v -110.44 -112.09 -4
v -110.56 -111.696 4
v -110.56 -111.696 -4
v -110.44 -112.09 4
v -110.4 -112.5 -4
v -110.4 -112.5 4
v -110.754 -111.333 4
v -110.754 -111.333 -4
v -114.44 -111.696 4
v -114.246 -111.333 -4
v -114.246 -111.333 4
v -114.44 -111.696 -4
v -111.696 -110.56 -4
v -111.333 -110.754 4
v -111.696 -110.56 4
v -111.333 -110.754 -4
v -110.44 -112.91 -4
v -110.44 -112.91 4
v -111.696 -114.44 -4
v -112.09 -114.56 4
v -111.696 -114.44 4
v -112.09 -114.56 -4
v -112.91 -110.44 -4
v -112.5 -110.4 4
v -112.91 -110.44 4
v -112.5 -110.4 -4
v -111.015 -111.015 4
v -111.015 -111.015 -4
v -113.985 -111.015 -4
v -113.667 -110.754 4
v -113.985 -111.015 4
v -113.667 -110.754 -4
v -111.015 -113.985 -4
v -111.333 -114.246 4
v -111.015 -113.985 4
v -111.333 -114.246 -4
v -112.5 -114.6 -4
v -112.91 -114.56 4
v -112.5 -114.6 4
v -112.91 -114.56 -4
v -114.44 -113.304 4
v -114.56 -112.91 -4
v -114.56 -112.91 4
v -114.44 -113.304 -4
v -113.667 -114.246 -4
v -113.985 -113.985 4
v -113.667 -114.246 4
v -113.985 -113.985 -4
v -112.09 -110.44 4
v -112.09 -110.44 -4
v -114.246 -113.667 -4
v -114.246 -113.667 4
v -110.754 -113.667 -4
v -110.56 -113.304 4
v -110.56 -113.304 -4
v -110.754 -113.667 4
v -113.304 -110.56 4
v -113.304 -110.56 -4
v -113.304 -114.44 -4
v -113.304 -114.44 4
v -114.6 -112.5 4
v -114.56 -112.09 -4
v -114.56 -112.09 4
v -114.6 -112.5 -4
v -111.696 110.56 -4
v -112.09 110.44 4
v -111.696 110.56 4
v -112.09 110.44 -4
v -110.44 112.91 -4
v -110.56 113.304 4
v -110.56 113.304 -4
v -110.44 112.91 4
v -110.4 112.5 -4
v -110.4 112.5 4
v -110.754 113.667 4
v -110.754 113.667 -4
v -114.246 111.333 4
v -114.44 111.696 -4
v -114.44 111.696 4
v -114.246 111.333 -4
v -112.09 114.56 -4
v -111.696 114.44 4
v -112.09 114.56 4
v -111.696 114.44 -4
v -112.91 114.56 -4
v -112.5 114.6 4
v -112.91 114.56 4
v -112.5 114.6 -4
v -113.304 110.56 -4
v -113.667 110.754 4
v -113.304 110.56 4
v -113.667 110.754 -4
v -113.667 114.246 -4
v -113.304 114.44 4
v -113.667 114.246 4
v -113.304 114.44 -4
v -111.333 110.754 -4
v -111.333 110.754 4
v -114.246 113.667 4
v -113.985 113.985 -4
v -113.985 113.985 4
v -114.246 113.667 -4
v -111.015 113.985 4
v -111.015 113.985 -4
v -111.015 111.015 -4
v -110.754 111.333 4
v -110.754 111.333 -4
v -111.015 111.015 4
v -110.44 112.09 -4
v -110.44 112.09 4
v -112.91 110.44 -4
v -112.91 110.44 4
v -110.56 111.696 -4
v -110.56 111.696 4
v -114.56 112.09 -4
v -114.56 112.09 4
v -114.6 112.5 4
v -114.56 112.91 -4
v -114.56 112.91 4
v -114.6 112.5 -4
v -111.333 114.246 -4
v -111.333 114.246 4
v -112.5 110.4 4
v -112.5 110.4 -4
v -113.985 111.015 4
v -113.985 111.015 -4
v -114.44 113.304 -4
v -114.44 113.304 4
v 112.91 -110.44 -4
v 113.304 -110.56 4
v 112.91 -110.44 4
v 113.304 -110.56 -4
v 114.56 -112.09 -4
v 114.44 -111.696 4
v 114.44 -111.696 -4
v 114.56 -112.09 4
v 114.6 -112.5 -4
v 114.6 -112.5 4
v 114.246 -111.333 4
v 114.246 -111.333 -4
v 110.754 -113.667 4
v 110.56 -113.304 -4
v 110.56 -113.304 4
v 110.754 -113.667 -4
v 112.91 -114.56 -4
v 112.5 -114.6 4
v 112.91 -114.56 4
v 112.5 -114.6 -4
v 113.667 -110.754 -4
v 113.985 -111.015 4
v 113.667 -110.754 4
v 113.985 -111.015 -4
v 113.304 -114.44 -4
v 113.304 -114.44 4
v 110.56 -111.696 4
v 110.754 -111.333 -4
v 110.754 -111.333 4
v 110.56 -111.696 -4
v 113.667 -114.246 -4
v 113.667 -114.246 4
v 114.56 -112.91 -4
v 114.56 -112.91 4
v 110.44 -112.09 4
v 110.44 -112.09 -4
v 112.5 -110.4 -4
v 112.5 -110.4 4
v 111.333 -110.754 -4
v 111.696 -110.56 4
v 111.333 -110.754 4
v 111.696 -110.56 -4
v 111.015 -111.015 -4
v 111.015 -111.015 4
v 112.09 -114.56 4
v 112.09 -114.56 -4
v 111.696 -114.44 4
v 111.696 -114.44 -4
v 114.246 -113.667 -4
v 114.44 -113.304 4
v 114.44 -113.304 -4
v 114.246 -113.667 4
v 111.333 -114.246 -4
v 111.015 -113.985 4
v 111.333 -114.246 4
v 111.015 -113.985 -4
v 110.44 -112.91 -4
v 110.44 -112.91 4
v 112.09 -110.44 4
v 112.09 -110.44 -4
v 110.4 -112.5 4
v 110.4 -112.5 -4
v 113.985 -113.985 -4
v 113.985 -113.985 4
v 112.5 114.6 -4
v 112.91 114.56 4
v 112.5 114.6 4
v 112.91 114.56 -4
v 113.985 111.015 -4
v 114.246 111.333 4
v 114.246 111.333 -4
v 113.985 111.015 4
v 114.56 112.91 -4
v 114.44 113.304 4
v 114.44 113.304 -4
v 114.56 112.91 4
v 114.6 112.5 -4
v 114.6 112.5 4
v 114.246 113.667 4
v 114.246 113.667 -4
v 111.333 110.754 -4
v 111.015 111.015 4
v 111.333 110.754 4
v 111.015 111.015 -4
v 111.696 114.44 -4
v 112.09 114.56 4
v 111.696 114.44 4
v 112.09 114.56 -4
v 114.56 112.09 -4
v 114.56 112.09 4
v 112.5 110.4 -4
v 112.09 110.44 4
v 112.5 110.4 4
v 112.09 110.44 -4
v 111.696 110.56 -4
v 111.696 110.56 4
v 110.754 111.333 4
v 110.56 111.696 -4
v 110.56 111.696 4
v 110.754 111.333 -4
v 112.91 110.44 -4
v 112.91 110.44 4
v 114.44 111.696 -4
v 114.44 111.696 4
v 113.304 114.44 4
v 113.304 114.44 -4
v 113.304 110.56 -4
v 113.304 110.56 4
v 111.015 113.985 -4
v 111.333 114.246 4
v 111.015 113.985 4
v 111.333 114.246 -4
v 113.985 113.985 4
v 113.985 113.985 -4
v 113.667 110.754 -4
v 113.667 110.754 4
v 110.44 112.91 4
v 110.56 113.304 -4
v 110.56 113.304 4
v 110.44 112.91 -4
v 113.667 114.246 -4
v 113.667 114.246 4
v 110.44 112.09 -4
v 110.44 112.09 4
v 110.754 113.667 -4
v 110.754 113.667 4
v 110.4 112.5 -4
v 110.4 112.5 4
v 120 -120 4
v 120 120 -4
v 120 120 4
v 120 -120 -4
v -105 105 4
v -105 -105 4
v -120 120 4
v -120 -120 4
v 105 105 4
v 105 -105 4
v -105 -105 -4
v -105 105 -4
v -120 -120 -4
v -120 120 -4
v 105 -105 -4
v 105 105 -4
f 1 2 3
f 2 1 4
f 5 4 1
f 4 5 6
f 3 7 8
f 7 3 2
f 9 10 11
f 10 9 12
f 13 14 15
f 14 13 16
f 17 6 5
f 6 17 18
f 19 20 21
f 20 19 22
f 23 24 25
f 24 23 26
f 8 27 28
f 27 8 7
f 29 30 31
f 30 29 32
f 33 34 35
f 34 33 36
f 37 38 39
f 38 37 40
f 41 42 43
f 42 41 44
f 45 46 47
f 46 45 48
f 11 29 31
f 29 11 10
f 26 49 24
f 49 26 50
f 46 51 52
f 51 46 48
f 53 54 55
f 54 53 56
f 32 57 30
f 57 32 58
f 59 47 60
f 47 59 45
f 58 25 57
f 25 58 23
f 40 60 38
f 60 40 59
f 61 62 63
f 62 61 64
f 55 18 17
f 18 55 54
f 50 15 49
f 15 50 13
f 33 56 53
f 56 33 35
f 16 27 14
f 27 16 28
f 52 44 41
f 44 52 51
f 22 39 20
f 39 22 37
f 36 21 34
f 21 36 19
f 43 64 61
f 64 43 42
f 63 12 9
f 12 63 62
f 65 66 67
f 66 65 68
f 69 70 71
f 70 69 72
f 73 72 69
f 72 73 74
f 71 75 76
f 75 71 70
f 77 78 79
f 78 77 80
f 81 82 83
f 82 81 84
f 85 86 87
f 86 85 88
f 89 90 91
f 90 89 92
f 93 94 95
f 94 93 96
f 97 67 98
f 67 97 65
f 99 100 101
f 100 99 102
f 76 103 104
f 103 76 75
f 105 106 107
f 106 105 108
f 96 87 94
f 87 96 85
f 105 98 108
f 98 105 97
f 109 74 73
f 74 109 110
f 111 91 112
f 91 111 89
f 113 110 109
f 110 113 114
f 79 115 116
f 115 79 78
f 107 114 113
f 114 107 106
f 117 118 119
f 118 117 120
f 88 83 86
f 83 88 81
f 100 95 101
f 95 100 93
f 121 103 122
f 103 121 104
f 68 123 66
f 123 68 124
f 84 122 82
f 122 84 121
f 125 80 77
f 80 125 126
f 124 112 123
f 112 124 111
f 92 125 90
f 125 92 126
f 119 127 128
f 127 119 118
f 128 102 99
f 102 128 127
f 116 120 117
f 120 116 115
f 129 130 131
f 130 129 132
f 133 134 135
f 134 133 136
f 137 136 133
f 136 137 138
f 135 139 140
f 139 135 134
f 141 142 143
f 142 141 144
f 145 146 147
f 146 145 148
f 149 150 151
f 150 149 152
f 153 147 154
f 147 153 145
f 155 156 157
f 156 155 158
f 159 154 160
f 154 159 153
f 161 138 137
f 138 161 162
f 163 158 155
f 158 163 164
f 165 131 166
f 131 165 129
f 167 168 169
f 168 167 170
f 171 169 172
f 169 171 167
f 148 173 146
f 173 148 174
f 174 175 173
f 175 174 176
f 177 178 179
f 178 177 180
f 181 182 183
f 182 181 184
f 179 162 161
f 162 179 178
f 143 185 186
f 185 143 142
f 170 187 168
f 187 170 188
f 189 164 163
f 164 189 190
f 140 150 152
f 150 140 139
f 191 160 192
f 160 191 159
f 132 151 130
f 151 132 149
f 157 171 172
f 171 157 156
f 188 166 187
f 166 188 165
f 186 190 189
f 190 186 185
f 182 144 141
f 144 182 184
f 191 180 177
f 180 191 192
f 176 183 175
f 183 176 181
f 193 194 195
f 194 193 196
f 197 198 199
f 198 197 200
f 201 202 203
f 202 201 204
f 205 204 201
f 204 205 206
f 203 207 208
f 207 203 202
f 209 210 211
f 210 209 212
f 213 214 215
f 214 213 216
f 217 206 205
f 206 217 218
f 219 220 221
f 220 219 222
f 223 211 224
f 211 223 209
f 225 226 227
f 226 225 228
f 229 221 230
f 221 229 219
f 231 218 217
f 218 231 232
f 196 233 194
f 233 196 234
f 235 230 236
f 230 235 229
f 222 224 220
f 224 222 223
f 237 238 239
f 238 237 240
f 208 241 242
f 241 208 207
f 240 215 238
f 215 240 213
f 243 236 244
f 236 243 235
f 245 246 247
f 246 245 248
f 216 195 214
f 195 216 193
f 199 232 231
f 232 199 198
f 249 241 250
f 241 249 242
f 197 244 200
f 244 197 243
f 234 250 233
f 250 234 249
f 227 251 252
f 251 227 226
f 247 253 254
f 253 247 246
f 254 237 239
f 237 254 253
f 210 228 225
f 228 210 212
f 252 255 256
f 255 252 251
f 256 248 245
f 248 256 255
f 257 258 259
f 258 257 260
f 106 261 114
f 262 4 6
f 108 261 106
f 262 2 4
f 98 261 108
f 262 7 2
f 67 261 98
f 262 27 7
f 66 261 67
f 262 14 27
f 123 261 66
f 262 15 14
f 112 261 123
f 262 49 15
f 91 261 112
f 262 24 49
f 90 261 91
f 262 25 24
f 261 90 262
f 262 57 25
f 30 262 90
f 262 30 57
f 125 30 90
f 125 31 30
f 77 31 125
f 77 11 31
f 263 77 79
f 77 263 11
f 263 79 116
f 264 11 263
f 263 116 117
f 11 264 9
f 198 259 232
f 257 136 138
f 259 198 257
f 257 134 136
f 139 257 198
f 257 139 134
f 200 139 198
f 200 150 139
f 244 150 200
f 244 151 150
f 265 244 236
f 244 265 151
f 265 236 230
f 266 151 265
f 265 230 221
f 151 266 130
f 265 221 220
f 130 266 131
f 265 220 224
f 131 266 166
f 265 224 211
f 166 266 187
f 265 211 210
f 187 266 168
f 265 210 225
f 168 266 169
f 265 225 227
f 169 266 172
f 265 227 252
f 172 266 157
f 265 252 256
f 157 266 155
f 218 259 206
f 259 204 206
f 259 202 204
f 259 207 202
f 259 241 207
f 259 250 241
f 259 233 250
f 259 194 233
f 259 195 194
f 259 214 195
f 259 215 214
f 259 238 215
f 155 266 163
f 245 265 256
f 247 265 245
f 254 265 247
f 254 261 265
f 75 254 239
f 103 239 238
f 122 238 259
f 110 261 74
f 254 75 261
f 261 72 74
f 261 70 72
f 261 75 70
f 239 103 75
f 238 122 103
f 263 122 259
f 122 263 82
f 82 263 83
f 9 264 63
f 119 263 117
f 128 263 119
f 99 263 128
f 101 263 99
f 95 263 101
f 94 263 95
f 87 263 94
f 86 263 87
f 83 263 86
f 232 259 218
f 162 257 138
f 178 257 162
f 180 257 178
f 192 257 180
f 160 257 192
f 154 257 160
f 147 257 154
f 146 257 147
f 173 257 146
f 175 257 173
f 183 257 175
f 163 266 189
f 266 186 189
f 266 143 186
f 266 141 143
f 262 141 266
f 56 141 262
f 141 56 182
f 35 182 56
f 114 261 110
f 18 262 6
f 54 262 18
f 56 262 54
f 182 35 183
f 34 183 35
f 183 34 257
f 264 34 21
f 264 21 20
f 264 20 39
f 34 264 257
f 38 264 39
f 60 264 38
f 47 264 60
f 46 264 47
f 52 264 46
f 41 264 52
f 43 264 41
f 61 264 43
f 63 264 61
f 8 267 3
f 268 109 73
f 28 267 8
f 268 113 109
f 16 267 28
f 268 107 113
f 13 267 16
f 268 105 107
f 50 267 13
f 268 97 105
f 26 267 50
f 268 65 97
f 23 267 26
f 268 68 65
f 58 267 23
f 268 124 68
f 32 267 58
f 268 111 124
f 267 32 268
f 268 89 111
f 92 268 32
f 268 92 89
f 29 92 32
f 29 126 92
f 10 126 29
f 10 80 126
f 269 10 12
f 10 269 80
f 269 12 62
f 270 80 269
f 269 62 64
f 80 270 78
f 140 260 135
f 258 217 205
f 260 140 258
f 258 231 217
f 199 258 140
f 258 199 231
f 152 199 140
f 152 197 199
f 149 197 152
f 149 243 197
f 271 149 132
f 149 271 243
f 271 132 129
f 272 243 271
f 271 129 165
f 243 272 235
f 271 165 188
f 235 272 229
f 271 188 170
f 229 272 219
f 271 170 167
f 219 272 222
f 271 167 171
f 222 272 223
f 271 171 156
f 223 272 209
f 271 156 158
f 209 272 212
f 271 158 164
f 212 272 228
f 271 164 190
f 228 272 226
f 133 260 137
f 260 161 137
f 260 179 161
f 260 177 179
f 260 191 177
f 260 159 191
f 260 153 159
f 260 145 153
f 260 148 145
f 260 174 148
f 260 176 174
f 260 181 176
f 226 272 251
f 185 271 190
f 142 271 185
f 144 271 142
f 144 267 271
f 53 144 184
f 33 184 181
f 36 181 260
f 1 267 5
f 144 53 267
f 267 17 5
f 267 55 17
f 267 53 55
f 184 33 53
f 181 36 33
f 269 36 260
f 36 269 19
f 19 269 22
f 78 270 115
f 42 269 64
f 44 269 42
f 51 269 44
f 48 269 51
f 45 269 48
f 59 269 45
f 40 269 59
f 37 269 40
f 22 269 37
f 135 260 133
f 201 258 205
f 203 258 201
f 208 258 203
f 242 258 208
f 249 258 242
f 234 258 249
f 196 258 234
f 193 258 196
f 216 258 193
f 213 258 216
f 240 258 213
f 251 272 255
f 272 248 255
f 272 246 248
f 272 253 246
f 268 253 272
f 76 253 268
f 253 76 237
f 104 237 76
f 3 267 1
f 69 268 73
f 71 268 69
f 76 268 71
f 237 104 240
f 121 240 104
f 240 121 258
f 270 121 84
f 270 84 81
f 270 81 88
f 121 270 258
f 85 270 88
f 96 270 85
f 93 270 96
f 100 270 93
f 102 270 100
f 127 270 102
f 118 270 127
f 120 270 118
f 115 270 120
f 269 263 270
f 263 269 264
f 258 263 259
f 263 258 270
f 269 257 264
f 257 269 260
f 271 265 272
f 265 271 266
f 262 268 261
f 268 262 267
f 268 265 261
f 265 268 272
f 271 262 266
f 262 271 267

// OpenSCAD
// Rover pad frame concept, mm; separate deck required. Not load qualified.
side=240; rim=15; height=8; hole=4.2;
assert(side>4*rim && height>0 && hole>0 && hole<rim);
difference(){
  cube([side,side,height],center=true);
  cube([side-2*rim,side-2*rim,height+2],center=true);
  for(x=[-side/2+rim/2,side/2-rim/2])
    for(y=[-side/2+rim/2,side/2-rim/2])
      translate([x,y,0]) cylinder(h=height+2,d=hole,center=true,$fn=32);
}
